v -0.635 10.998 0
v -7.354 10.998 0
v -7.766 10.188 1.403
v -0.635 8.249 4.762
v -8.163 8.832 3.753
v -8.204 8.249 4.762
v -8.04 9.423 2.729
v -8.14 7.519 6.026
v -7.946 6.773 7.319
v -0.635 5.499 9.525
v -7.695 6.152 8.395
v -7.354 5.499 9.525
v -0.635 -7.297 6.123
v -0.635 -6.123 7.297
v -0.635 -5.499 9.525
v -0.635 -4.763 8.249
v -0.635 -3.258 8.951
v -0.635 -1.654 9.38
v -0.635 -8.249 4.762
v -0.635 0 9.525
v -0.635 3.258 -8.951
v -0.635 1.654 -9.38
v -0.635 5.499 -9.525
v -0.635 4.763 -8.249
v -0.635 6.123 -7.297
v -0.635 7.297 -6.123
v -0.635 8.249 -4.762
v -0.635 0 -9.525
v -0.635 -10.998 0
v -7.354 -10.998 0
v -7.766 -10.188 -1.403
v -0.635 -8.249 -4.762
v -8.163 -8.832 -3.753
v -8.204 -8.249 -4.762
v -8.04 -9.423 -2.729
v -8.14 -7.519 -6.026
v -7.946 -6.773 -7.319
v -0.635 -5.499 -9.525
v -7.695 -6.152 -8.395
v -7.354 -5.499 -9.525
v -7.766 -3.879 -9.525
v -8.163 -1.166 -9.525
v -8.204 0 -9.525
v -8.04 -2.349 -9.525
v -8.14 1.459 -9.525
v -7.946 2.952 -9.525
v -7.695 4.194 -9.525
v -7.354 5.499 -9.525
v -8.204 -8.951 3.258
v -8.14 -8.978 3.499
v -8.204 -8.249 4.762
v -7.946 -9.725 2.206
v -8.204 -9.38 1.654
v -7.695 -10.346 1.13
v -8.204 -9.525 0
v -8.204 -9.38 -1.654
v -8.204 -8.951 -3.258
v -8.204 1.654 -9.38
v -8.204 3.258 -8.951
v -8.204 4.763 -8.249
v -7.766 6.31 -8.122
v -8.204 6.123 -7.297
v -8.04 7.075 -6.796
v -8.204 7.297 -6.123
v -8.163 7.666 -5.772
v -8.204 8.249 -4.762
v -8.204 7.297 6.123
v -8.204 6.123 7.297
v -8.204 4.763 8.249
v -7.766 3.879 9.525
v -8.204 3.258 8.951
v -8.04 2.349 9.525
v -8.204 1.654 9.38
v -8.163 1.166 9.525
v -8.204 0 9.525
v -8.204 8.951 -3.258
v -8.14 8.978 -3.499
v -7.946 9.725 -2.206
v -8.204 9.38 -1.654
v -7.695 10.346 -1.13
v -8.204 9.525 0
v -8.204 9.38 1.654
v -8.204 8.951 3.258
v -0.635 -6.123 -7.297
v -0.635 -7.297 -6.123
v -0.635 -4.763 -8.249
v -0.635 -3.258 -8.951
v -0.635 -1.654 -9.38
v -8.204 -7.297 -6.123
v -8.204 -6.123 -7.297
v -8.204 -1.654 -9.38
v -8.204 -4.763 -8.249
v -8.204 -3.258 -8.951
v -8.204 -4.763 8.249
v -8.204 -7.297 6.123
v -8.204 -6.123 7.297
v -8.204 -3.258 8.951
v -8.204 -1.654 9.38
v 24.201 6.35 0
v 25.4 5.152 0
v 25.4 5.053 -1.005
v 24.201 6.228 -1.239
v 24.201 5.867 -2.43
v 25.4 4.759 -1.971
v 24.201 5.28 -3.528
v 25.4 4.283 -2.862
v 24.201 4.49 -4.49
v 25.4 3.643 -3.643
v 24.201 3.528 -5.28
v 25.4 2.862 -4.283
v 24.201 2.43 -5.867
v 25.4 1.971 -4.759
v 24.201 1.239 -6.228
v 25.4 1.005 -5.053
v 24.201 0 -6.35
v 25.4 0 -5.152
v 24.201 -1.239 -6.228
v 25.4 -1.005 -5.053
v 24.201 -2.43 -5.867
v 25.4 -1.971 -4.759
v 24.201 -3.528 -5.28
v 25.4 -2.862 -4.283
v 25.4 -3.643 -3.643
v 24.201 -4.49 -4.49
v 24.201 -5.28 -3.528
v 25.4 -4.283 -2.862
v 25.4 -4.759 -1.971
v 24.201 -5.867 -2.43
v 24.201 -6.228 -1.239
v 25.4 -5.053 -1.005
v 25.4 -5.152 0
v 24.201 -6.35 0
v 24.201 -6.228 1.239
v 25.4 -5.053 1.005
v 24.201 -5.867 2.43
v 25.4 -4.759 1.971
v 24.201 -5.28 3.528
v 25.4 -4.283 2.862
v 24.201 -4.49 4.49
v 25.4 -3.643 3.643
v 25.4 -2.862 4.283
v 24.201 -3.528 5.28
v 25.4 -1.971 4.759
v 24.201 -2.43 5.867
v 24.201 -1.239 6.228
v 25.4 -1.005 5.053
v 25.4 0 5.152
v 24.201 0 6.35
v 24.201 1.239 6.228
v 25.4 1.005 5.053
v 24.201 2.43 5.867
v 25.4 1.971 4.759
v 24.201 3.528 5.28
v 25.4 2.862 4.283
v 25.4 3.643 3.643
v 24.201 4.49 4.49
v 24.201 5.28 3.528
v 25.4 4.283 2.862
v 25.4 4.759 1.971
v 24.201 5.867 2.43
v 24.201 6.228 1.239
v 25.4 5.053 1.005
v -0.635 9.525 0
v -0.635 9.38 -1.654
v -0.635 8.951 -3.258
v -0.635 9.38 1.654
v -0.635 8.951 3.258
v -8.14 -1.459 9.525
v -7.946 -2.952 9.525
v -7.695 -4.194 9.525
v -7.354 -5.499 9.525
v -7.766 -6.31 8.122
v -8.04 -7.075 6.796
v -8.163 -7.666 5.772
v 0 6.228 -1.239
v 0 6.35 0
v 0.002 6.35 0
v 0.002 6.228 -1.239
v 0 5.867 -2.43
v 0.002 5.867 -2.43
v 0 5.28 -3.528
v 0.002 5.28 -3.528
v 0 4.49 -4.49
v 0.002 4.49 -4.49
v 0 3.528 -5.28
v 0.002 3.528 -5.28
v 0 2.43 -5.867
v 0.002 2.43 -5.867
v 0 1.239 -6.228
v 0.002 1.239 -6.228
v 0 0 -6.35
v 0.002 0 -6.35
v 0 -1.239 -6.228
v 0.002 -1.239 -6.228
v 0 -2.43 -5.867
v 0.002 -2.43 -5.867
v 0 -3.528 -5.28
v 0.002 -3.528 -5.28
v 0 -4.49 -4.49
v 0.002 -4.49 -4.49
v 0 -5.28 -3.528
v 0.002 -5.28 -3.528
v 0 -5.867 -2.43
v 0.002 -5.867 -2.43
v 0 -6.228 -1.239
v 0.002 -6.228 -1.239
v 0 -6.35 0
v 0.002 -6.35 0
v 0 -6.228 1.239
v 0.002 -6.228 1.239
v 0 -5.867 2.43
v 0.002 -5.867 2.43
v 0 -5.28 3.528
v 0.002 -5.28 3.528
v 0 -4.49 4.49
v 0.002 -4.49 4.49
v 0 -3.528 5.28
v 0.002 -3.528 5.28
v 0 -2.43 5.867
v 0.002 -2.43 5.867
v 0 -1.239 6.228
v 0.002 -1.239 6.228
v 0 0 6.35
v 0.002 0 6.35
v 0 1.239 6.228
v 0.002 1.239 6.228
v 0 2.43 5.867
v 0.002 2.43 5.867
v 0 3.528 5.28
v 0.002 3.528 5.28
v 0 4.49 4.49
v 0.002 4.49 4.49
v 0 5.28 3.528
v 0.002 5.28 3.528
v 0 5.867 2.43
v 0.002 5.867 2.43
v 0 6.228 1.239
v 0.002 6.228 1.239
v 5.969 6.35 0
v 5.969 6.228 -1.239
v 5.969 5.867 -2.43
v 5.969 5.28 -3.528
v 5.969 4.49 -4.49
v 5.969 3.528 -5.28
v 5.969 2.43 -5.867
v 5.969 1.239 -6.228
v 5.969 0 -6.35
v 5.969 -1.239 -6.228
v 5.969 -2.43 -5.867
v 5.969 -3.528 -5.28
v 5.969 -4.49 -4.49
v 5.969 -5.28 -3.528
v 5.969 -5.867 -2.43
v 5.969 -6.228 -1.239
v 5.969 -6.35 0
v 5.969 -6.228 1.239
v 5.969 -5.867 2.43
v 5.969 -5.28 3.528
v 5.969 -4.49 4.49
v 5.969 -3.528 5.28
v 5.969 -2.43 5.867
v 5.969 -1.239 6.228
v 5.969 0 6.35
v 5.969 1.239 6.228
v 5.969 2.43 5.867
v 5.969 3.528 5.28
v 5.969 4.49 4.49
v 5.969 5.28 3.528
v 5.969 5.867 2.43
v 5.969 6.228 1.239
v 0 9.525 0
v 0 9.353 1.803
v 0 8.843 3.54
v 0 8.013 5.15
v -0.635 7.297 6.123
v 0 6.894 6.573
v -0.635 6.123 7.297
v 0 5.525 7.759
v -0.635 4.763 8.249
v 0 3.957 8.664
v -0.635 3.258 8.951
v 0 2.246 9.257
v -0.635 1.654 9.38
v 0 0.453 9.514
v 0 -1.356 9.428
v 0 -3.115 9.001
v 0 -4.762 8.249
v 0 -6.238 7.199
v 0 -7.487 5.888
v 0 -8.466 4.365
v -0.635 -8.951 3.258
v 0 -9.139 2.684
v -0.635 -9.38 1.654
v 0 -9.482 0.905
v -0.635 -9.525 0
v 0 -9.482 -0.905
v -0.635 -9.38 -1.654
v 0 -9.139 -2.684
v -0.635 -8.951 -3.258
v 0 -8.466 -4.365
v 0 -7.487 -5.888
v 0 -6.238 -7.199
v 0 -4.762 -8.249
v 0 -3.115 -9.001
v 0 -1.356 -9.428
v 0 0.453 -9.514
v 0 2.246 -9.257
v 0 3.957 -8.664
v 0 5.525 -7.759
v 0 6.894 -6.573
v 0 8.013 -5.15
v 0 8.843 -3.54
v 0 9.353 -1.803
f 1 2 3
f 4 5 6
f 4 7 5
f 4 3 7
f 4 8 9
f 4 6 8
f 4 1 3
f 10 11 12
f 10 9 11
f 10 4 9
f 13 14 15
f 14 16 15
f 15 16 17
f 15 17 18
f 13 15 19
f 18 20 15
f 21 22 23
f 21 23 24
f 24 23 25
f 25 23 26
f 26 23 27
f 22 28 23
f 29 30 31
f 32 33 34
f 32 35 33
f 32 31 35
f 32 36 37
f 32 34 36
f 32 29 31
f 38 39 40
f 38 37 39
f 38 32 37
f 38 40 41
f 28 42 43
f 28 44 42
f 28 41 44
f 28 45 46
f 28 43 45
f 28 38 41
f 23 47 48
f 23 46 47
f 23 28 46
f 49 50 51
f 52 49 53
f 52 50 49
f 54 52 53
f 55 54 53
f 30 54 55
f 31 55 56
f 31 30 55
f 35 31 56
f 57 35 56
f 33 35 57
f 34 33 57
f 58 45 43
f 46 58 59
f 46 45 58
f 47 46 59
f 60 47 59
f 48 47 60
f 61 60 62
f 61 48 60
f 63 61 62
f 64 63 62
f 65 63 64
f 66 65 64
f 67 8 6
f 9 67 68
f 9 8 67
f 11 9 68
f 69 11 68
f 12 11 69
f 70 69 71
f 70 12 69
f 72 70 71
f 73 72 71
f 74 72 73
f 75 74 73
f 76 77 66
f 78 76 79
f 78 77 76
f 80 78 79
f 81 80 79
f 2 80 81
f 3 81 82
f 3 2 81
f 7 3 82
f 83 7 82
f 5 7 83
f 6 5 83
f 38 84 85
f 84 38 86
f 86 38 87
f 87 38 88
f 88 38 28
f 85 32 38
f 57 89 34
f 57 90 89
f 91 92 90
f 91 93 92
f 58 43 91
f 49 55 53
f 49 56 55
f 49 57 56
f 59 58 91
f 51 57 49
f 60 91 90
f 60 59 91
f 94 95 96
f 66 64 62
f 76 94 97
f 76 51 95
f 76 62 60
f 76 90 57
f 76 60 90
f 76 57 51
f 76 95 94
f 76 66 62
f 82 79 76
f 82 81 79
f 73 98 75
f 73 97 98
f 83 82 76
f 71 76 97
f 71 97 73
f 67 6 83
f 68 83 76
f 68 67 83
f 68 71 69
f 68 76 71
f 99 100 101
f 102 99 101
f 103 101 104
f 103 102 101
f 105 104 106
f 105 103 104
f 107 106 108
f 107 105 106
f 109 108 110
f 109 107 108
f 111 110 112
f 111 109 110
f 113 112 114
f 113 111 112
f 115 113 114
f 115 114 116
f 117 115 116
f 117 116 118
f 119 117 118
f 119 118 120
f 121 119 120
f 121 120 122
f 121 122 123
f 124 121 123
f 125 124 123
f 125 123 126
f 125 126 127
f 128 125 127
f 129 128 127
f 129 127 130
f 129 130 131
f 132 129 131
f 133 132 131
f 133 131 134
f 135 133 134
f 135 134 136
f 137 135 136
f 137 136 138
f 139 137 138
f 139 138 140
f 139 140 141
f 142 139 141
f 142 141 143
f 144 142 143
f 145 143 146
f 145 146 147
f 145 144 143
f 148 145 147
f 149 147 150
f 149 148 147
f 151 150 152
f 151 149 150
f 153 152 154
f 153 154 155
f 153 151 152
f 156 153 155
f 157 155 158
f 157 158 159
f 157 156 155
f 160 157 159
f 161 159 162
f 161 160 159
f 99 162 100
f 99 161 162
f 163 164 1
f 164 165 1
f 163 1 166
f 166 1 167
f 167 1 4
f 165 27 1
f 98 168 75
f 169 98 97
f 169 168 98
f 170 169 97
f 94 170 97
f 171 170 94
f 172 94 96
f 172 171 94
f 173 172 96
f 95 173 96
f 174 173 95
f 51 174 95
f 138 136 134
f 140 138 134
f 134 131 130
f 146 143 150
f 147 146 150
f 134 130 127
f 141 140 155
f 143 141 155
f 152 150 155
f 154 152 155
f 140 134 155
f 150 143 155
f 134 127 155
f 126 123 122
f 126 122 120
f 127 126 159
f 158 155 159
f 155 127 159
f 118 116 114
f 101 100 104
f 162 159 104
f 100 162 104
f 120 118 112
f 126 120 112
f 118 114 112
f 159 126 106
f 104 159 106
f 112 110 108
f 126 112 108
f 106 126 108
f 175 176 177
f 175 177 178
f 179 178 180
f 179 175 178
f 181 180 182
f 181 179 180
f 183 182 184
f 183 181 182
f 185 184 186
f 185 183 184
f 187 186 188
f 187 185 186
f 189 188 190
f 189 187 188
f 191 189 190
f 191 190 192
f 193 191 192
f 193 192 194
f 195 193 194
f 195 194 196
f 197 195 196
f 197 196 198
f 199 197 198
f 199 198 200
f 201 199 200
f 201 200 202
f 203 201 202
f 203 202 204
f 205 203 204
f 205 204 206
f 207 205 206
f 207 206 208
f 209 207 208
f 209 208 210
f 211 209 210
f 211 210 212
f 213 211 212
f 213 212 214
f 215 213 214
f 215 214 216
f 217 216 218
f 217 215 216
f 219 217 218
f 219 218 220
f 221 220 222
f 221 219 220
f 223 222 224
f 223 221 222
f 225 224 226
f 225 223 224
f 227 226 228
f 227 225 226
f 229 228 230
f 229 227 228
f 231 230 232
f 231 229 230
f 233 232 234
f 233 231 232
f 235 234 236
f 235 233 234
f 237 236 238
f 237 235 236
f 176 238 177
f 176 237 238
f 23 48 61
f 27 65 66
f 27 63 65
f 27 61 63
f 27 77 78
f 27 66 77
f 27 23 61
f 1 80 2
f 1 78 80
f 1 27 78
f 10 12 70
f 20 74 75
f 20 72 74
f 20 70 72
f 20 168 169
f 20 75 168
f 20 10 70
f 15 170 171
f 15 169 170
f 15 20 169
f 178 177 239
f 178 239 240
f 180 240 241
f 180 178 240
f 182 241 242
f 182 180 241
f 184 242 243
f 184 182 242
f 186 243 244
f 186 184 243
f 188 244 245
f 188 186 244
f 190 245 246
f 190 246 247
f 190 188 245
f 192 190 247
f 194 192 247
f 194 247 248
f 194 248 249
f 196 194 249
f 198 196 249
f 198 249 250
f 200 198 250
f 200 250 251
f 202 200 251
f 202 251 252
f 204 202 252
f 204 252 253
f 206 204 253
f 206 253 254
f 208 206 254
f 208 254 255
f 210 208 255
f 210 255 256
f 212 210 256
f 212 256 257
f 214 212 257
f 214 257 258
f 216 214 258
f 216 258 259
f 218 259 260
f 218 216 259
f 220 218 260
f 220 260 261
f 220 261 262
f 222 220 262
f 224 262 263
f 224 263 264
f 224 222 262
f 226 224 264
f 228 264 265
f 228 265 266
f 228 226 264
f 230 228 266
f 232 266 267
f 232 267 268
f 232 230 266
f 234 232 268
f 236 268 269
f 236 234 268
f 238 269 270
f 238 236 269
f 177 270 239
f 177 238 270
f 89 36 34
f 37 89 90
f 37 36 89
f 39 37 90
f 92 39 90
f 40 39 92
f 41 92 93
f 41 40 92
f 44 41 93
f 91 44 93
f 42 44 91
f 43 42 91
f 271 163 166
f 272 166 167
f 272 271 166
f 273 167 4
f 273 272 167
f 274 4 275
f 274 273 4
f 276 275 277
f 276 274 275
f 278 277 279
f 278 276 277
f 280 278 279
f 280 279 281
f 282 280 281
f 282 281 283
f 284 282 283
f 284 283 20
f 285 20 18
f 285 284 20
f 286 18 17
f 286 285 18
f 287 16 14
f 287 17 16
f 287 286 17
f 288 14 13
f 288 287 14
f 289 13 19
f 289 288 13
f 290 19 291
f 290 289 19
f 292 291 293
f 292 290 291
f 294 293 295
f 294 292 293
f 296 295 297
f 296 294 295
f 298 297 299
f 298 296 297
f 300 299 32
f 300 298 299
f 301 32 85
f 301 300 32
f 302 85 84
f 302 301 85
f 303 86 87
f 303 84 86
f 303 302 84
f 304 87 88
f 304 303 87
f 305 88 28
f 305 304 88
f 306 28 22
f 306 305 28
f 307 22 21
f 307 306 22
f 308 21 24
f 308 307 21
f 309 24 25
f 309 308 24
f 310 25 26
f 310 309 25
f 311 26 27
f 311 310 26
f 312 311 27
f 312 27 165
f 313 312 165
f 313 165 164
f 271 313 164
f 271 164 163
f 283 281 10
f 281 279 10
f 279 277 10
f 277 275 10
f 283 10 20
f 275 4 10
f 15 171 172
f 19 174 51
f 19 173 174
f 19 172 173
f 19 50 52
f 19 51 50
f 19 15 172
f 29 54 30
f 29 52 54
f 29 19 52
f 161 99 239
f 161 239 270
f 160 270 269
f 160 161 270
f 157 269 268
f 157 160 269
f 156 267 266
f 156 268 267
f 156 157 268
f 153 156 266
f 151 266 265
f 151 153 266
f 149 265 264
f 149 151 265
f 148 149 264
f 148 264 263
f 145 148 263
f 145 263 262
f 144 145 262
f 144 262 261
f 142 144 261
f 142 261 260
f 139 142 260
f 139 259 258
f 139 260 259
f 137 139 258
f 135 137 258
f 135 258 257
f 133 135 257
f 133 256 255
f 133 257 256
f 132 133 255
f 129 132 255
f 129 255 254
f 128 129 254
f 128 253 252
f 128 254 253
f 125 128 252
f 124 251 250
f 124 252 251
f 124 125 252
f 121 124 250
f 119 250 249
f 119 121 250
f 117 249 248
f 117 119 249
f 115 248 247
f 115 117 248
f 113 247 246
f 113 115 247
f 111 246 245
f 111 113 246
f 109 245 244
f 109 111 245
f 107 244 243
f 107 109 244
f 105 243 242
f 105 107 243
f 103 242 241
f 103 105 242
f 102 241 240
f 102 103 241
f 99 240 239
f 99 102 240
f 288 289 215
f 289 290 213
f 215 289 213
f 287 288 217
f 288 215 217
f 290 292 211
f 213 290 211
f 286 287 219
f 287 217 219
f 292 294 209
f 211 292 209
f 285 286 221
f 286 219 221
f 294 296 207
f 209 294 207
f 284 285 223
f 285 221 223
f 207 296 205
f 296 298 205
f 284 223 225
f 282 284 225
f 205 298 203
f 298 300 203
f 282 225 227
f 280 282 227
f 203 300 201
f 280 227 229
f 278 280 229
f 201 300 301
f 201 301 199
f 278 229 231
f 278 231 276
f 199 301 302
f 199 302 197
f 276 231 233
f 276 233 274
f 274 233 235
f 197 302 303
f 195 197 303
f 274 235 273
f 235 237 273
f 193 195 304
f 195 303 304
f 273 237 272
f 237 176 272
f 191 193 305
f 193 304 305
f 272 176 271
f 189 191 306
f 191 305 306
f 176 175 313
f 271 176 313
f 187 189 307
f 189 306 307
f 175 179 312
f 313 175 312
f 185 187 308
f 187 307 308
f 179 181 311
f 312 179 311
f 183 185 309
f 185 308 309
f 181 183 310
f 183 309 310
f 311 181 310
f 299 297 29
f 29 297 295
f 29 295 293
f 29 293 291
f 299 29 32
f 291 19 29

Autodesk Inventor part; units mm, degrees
ref_plane "YZ Plane" through (0, 0, 0) normal (1, 0, 0) x (0, 1, 0)
ref_plane "XZ Plane" through (0, 0, 0) normal (0, 1, 0) x (-1, 0, 0)
sketch "Sketch1" plane through (0, 0, 0) normal (0, 0, 1) x (1, 0, 0)
  line L0 (0, 9.525) -> (0, 6.35)
  line L1 (5.969, 6.35) -> (25.4, 6.35)
  line L2 (25.4, 6.35) -> (25.4, 0)
  line L3 (25.4, 0) -> (-0.6351, 0)
  line L4 (-5.8421, 0) -> (30.607, 0) projected
  line L5 (-0.6351, 0) -> (-0.6351, 9.525)
  line L6 (-0.6351, 9.525) -> (0, 9.525)
  line L7 (5.969, 6.35) -> (0.0024, 6.35)
  line L8 (0.0024, 6.35) -> (0, 6.35)
  line L9 (0, -1.905) -> (0, 11.43) projected
  dimension "d0" = 25.4
  dimension "d1" = 19.431
  dimension "d2" = 12.7
  dimension "d9" = 0.6351
  dimension "d10" = 19.05
  dimension "d13" = 5.9666
  dimension "d14" = 12.7
revolve "Body" add sketch "Sketch1" angle 360 about axis through (25.4, 0, 0) along (-1, 0, 0)
sketch "Sketch2" plane through (-0.6351, 0, 0) normal (-1, 0, 0) x (0, 0, 1)
  line L0 (0, 10.9985) -> (9.525, 5.4993)
  line L1 (9.525, 5.4993) -> (9.525, -5.4993)
  line L2 (9.525, -5.4993) -> (0, -10.9985)
  line L3 (0, -10.9985) -> (-9.525, -5.4993)
  line L4 (-9.525, -5.4993) -> (-9.525, 5.4993)
  line L5 (-9.525, 5.4993) -> (0, 10.9985)
  point P0 (0, 0)
  point P1 (0, 0)
  dimension "d11" = 19.05
extrude "Head" add sketch "Sketch2" along normal blind 7.5692
sketch "Sketch4" plane through (0, 0, 0) normal (0, 0, 1) x (1, 0, 0)
  line L0 (-8.2043, 9.525) -> (-8.2043, 10.9985)
  line L1 (-8.2043, 10.9985) -> (-7.3536, 10.9985)
  line L2 (-7.3536, 10.9985) -> (-8.2043, 9.525)
  line L3 (-9.7181, 0) -> (0.8787, 0) projected
  line L4 (-0.6351, 10.9985) -> (-8.2043, 10.9985) projected
  line L5 (-8.2043, 5.4993) -> (-8.2043, 10.9985) projected
  dimension "d5" = 30
  dimension "d19" = 19.05
revolve "Chamfer1" cut sketch "Sketch4" angle 360 about axis through (-10, 0, 0) along (1, 0, 0)
thread "Thread" size "1/2-13 UNC" class "2A" standard "ANSI Unified Screw Threads" length 19.431
chamfer "Chamfer2" distance 1.1985 distance2 1.1987 1 edges at (25.4, -6.35, 0) measured on face at (25.4, -1.4034, 0.0866)
ref_plane "Work Plane1" through (1.525, 0, 0) normal (0, 0, 1) x (1, 0, 0)
equation "\"d0\" = NLG"
equation "\"d1\" = GEL"
equation "\"d2\" = GD"
equation "\"d10\" = SD2"
equation "\"d14\" = BDM"
equation "\"d11\" = SW"
equation "\"d3\" = KOH - SD"
equation "\"d5\" = ANG1"
equation "\"d19\" = SW0"
equation "\"d15\" = GEL"
equation "\"d6\" = -0.5 * SPD + 0.5 * GD"
equation "\"NLG\" = 25.4"
equation "\"GD\" = 12.7"
equation "\"BDM\" = 12.7"
equation "\"KOH\" = 8.2042"
equation "\"GEL\" = 19.431"
equation "\"SW\" = 19.05"
equation "\"SW0\" = SW"
equation "\"SPD\" = GD1"
equation "\"SD2\" = SW"
equation "\"SD\" = 0.635"
equation "\"ANG1\" = 30deg"
equation "\"GAL\" = 5.96646"
equation "\"GUL\" = 1.19863"
equation "\"RR\" = 0.381"
equation "\"WFT\" = SD"
equation "\"GD1\" = 10.303"
equation "\"THREADDIA\" = 12.7"
equation "\"SDH\" = SW"
equation "\"SDHG\" = 0.00254"
equation "\"TOA\" = 30deg"
equation "\"FAWI\" = 45deg"
equation "\"NND\" = 12.7"
equation "\"E0\" = 22.00275"
properties part number "AS 2465 - 1/2 x 1  UNC" material "Steel, Mild"
